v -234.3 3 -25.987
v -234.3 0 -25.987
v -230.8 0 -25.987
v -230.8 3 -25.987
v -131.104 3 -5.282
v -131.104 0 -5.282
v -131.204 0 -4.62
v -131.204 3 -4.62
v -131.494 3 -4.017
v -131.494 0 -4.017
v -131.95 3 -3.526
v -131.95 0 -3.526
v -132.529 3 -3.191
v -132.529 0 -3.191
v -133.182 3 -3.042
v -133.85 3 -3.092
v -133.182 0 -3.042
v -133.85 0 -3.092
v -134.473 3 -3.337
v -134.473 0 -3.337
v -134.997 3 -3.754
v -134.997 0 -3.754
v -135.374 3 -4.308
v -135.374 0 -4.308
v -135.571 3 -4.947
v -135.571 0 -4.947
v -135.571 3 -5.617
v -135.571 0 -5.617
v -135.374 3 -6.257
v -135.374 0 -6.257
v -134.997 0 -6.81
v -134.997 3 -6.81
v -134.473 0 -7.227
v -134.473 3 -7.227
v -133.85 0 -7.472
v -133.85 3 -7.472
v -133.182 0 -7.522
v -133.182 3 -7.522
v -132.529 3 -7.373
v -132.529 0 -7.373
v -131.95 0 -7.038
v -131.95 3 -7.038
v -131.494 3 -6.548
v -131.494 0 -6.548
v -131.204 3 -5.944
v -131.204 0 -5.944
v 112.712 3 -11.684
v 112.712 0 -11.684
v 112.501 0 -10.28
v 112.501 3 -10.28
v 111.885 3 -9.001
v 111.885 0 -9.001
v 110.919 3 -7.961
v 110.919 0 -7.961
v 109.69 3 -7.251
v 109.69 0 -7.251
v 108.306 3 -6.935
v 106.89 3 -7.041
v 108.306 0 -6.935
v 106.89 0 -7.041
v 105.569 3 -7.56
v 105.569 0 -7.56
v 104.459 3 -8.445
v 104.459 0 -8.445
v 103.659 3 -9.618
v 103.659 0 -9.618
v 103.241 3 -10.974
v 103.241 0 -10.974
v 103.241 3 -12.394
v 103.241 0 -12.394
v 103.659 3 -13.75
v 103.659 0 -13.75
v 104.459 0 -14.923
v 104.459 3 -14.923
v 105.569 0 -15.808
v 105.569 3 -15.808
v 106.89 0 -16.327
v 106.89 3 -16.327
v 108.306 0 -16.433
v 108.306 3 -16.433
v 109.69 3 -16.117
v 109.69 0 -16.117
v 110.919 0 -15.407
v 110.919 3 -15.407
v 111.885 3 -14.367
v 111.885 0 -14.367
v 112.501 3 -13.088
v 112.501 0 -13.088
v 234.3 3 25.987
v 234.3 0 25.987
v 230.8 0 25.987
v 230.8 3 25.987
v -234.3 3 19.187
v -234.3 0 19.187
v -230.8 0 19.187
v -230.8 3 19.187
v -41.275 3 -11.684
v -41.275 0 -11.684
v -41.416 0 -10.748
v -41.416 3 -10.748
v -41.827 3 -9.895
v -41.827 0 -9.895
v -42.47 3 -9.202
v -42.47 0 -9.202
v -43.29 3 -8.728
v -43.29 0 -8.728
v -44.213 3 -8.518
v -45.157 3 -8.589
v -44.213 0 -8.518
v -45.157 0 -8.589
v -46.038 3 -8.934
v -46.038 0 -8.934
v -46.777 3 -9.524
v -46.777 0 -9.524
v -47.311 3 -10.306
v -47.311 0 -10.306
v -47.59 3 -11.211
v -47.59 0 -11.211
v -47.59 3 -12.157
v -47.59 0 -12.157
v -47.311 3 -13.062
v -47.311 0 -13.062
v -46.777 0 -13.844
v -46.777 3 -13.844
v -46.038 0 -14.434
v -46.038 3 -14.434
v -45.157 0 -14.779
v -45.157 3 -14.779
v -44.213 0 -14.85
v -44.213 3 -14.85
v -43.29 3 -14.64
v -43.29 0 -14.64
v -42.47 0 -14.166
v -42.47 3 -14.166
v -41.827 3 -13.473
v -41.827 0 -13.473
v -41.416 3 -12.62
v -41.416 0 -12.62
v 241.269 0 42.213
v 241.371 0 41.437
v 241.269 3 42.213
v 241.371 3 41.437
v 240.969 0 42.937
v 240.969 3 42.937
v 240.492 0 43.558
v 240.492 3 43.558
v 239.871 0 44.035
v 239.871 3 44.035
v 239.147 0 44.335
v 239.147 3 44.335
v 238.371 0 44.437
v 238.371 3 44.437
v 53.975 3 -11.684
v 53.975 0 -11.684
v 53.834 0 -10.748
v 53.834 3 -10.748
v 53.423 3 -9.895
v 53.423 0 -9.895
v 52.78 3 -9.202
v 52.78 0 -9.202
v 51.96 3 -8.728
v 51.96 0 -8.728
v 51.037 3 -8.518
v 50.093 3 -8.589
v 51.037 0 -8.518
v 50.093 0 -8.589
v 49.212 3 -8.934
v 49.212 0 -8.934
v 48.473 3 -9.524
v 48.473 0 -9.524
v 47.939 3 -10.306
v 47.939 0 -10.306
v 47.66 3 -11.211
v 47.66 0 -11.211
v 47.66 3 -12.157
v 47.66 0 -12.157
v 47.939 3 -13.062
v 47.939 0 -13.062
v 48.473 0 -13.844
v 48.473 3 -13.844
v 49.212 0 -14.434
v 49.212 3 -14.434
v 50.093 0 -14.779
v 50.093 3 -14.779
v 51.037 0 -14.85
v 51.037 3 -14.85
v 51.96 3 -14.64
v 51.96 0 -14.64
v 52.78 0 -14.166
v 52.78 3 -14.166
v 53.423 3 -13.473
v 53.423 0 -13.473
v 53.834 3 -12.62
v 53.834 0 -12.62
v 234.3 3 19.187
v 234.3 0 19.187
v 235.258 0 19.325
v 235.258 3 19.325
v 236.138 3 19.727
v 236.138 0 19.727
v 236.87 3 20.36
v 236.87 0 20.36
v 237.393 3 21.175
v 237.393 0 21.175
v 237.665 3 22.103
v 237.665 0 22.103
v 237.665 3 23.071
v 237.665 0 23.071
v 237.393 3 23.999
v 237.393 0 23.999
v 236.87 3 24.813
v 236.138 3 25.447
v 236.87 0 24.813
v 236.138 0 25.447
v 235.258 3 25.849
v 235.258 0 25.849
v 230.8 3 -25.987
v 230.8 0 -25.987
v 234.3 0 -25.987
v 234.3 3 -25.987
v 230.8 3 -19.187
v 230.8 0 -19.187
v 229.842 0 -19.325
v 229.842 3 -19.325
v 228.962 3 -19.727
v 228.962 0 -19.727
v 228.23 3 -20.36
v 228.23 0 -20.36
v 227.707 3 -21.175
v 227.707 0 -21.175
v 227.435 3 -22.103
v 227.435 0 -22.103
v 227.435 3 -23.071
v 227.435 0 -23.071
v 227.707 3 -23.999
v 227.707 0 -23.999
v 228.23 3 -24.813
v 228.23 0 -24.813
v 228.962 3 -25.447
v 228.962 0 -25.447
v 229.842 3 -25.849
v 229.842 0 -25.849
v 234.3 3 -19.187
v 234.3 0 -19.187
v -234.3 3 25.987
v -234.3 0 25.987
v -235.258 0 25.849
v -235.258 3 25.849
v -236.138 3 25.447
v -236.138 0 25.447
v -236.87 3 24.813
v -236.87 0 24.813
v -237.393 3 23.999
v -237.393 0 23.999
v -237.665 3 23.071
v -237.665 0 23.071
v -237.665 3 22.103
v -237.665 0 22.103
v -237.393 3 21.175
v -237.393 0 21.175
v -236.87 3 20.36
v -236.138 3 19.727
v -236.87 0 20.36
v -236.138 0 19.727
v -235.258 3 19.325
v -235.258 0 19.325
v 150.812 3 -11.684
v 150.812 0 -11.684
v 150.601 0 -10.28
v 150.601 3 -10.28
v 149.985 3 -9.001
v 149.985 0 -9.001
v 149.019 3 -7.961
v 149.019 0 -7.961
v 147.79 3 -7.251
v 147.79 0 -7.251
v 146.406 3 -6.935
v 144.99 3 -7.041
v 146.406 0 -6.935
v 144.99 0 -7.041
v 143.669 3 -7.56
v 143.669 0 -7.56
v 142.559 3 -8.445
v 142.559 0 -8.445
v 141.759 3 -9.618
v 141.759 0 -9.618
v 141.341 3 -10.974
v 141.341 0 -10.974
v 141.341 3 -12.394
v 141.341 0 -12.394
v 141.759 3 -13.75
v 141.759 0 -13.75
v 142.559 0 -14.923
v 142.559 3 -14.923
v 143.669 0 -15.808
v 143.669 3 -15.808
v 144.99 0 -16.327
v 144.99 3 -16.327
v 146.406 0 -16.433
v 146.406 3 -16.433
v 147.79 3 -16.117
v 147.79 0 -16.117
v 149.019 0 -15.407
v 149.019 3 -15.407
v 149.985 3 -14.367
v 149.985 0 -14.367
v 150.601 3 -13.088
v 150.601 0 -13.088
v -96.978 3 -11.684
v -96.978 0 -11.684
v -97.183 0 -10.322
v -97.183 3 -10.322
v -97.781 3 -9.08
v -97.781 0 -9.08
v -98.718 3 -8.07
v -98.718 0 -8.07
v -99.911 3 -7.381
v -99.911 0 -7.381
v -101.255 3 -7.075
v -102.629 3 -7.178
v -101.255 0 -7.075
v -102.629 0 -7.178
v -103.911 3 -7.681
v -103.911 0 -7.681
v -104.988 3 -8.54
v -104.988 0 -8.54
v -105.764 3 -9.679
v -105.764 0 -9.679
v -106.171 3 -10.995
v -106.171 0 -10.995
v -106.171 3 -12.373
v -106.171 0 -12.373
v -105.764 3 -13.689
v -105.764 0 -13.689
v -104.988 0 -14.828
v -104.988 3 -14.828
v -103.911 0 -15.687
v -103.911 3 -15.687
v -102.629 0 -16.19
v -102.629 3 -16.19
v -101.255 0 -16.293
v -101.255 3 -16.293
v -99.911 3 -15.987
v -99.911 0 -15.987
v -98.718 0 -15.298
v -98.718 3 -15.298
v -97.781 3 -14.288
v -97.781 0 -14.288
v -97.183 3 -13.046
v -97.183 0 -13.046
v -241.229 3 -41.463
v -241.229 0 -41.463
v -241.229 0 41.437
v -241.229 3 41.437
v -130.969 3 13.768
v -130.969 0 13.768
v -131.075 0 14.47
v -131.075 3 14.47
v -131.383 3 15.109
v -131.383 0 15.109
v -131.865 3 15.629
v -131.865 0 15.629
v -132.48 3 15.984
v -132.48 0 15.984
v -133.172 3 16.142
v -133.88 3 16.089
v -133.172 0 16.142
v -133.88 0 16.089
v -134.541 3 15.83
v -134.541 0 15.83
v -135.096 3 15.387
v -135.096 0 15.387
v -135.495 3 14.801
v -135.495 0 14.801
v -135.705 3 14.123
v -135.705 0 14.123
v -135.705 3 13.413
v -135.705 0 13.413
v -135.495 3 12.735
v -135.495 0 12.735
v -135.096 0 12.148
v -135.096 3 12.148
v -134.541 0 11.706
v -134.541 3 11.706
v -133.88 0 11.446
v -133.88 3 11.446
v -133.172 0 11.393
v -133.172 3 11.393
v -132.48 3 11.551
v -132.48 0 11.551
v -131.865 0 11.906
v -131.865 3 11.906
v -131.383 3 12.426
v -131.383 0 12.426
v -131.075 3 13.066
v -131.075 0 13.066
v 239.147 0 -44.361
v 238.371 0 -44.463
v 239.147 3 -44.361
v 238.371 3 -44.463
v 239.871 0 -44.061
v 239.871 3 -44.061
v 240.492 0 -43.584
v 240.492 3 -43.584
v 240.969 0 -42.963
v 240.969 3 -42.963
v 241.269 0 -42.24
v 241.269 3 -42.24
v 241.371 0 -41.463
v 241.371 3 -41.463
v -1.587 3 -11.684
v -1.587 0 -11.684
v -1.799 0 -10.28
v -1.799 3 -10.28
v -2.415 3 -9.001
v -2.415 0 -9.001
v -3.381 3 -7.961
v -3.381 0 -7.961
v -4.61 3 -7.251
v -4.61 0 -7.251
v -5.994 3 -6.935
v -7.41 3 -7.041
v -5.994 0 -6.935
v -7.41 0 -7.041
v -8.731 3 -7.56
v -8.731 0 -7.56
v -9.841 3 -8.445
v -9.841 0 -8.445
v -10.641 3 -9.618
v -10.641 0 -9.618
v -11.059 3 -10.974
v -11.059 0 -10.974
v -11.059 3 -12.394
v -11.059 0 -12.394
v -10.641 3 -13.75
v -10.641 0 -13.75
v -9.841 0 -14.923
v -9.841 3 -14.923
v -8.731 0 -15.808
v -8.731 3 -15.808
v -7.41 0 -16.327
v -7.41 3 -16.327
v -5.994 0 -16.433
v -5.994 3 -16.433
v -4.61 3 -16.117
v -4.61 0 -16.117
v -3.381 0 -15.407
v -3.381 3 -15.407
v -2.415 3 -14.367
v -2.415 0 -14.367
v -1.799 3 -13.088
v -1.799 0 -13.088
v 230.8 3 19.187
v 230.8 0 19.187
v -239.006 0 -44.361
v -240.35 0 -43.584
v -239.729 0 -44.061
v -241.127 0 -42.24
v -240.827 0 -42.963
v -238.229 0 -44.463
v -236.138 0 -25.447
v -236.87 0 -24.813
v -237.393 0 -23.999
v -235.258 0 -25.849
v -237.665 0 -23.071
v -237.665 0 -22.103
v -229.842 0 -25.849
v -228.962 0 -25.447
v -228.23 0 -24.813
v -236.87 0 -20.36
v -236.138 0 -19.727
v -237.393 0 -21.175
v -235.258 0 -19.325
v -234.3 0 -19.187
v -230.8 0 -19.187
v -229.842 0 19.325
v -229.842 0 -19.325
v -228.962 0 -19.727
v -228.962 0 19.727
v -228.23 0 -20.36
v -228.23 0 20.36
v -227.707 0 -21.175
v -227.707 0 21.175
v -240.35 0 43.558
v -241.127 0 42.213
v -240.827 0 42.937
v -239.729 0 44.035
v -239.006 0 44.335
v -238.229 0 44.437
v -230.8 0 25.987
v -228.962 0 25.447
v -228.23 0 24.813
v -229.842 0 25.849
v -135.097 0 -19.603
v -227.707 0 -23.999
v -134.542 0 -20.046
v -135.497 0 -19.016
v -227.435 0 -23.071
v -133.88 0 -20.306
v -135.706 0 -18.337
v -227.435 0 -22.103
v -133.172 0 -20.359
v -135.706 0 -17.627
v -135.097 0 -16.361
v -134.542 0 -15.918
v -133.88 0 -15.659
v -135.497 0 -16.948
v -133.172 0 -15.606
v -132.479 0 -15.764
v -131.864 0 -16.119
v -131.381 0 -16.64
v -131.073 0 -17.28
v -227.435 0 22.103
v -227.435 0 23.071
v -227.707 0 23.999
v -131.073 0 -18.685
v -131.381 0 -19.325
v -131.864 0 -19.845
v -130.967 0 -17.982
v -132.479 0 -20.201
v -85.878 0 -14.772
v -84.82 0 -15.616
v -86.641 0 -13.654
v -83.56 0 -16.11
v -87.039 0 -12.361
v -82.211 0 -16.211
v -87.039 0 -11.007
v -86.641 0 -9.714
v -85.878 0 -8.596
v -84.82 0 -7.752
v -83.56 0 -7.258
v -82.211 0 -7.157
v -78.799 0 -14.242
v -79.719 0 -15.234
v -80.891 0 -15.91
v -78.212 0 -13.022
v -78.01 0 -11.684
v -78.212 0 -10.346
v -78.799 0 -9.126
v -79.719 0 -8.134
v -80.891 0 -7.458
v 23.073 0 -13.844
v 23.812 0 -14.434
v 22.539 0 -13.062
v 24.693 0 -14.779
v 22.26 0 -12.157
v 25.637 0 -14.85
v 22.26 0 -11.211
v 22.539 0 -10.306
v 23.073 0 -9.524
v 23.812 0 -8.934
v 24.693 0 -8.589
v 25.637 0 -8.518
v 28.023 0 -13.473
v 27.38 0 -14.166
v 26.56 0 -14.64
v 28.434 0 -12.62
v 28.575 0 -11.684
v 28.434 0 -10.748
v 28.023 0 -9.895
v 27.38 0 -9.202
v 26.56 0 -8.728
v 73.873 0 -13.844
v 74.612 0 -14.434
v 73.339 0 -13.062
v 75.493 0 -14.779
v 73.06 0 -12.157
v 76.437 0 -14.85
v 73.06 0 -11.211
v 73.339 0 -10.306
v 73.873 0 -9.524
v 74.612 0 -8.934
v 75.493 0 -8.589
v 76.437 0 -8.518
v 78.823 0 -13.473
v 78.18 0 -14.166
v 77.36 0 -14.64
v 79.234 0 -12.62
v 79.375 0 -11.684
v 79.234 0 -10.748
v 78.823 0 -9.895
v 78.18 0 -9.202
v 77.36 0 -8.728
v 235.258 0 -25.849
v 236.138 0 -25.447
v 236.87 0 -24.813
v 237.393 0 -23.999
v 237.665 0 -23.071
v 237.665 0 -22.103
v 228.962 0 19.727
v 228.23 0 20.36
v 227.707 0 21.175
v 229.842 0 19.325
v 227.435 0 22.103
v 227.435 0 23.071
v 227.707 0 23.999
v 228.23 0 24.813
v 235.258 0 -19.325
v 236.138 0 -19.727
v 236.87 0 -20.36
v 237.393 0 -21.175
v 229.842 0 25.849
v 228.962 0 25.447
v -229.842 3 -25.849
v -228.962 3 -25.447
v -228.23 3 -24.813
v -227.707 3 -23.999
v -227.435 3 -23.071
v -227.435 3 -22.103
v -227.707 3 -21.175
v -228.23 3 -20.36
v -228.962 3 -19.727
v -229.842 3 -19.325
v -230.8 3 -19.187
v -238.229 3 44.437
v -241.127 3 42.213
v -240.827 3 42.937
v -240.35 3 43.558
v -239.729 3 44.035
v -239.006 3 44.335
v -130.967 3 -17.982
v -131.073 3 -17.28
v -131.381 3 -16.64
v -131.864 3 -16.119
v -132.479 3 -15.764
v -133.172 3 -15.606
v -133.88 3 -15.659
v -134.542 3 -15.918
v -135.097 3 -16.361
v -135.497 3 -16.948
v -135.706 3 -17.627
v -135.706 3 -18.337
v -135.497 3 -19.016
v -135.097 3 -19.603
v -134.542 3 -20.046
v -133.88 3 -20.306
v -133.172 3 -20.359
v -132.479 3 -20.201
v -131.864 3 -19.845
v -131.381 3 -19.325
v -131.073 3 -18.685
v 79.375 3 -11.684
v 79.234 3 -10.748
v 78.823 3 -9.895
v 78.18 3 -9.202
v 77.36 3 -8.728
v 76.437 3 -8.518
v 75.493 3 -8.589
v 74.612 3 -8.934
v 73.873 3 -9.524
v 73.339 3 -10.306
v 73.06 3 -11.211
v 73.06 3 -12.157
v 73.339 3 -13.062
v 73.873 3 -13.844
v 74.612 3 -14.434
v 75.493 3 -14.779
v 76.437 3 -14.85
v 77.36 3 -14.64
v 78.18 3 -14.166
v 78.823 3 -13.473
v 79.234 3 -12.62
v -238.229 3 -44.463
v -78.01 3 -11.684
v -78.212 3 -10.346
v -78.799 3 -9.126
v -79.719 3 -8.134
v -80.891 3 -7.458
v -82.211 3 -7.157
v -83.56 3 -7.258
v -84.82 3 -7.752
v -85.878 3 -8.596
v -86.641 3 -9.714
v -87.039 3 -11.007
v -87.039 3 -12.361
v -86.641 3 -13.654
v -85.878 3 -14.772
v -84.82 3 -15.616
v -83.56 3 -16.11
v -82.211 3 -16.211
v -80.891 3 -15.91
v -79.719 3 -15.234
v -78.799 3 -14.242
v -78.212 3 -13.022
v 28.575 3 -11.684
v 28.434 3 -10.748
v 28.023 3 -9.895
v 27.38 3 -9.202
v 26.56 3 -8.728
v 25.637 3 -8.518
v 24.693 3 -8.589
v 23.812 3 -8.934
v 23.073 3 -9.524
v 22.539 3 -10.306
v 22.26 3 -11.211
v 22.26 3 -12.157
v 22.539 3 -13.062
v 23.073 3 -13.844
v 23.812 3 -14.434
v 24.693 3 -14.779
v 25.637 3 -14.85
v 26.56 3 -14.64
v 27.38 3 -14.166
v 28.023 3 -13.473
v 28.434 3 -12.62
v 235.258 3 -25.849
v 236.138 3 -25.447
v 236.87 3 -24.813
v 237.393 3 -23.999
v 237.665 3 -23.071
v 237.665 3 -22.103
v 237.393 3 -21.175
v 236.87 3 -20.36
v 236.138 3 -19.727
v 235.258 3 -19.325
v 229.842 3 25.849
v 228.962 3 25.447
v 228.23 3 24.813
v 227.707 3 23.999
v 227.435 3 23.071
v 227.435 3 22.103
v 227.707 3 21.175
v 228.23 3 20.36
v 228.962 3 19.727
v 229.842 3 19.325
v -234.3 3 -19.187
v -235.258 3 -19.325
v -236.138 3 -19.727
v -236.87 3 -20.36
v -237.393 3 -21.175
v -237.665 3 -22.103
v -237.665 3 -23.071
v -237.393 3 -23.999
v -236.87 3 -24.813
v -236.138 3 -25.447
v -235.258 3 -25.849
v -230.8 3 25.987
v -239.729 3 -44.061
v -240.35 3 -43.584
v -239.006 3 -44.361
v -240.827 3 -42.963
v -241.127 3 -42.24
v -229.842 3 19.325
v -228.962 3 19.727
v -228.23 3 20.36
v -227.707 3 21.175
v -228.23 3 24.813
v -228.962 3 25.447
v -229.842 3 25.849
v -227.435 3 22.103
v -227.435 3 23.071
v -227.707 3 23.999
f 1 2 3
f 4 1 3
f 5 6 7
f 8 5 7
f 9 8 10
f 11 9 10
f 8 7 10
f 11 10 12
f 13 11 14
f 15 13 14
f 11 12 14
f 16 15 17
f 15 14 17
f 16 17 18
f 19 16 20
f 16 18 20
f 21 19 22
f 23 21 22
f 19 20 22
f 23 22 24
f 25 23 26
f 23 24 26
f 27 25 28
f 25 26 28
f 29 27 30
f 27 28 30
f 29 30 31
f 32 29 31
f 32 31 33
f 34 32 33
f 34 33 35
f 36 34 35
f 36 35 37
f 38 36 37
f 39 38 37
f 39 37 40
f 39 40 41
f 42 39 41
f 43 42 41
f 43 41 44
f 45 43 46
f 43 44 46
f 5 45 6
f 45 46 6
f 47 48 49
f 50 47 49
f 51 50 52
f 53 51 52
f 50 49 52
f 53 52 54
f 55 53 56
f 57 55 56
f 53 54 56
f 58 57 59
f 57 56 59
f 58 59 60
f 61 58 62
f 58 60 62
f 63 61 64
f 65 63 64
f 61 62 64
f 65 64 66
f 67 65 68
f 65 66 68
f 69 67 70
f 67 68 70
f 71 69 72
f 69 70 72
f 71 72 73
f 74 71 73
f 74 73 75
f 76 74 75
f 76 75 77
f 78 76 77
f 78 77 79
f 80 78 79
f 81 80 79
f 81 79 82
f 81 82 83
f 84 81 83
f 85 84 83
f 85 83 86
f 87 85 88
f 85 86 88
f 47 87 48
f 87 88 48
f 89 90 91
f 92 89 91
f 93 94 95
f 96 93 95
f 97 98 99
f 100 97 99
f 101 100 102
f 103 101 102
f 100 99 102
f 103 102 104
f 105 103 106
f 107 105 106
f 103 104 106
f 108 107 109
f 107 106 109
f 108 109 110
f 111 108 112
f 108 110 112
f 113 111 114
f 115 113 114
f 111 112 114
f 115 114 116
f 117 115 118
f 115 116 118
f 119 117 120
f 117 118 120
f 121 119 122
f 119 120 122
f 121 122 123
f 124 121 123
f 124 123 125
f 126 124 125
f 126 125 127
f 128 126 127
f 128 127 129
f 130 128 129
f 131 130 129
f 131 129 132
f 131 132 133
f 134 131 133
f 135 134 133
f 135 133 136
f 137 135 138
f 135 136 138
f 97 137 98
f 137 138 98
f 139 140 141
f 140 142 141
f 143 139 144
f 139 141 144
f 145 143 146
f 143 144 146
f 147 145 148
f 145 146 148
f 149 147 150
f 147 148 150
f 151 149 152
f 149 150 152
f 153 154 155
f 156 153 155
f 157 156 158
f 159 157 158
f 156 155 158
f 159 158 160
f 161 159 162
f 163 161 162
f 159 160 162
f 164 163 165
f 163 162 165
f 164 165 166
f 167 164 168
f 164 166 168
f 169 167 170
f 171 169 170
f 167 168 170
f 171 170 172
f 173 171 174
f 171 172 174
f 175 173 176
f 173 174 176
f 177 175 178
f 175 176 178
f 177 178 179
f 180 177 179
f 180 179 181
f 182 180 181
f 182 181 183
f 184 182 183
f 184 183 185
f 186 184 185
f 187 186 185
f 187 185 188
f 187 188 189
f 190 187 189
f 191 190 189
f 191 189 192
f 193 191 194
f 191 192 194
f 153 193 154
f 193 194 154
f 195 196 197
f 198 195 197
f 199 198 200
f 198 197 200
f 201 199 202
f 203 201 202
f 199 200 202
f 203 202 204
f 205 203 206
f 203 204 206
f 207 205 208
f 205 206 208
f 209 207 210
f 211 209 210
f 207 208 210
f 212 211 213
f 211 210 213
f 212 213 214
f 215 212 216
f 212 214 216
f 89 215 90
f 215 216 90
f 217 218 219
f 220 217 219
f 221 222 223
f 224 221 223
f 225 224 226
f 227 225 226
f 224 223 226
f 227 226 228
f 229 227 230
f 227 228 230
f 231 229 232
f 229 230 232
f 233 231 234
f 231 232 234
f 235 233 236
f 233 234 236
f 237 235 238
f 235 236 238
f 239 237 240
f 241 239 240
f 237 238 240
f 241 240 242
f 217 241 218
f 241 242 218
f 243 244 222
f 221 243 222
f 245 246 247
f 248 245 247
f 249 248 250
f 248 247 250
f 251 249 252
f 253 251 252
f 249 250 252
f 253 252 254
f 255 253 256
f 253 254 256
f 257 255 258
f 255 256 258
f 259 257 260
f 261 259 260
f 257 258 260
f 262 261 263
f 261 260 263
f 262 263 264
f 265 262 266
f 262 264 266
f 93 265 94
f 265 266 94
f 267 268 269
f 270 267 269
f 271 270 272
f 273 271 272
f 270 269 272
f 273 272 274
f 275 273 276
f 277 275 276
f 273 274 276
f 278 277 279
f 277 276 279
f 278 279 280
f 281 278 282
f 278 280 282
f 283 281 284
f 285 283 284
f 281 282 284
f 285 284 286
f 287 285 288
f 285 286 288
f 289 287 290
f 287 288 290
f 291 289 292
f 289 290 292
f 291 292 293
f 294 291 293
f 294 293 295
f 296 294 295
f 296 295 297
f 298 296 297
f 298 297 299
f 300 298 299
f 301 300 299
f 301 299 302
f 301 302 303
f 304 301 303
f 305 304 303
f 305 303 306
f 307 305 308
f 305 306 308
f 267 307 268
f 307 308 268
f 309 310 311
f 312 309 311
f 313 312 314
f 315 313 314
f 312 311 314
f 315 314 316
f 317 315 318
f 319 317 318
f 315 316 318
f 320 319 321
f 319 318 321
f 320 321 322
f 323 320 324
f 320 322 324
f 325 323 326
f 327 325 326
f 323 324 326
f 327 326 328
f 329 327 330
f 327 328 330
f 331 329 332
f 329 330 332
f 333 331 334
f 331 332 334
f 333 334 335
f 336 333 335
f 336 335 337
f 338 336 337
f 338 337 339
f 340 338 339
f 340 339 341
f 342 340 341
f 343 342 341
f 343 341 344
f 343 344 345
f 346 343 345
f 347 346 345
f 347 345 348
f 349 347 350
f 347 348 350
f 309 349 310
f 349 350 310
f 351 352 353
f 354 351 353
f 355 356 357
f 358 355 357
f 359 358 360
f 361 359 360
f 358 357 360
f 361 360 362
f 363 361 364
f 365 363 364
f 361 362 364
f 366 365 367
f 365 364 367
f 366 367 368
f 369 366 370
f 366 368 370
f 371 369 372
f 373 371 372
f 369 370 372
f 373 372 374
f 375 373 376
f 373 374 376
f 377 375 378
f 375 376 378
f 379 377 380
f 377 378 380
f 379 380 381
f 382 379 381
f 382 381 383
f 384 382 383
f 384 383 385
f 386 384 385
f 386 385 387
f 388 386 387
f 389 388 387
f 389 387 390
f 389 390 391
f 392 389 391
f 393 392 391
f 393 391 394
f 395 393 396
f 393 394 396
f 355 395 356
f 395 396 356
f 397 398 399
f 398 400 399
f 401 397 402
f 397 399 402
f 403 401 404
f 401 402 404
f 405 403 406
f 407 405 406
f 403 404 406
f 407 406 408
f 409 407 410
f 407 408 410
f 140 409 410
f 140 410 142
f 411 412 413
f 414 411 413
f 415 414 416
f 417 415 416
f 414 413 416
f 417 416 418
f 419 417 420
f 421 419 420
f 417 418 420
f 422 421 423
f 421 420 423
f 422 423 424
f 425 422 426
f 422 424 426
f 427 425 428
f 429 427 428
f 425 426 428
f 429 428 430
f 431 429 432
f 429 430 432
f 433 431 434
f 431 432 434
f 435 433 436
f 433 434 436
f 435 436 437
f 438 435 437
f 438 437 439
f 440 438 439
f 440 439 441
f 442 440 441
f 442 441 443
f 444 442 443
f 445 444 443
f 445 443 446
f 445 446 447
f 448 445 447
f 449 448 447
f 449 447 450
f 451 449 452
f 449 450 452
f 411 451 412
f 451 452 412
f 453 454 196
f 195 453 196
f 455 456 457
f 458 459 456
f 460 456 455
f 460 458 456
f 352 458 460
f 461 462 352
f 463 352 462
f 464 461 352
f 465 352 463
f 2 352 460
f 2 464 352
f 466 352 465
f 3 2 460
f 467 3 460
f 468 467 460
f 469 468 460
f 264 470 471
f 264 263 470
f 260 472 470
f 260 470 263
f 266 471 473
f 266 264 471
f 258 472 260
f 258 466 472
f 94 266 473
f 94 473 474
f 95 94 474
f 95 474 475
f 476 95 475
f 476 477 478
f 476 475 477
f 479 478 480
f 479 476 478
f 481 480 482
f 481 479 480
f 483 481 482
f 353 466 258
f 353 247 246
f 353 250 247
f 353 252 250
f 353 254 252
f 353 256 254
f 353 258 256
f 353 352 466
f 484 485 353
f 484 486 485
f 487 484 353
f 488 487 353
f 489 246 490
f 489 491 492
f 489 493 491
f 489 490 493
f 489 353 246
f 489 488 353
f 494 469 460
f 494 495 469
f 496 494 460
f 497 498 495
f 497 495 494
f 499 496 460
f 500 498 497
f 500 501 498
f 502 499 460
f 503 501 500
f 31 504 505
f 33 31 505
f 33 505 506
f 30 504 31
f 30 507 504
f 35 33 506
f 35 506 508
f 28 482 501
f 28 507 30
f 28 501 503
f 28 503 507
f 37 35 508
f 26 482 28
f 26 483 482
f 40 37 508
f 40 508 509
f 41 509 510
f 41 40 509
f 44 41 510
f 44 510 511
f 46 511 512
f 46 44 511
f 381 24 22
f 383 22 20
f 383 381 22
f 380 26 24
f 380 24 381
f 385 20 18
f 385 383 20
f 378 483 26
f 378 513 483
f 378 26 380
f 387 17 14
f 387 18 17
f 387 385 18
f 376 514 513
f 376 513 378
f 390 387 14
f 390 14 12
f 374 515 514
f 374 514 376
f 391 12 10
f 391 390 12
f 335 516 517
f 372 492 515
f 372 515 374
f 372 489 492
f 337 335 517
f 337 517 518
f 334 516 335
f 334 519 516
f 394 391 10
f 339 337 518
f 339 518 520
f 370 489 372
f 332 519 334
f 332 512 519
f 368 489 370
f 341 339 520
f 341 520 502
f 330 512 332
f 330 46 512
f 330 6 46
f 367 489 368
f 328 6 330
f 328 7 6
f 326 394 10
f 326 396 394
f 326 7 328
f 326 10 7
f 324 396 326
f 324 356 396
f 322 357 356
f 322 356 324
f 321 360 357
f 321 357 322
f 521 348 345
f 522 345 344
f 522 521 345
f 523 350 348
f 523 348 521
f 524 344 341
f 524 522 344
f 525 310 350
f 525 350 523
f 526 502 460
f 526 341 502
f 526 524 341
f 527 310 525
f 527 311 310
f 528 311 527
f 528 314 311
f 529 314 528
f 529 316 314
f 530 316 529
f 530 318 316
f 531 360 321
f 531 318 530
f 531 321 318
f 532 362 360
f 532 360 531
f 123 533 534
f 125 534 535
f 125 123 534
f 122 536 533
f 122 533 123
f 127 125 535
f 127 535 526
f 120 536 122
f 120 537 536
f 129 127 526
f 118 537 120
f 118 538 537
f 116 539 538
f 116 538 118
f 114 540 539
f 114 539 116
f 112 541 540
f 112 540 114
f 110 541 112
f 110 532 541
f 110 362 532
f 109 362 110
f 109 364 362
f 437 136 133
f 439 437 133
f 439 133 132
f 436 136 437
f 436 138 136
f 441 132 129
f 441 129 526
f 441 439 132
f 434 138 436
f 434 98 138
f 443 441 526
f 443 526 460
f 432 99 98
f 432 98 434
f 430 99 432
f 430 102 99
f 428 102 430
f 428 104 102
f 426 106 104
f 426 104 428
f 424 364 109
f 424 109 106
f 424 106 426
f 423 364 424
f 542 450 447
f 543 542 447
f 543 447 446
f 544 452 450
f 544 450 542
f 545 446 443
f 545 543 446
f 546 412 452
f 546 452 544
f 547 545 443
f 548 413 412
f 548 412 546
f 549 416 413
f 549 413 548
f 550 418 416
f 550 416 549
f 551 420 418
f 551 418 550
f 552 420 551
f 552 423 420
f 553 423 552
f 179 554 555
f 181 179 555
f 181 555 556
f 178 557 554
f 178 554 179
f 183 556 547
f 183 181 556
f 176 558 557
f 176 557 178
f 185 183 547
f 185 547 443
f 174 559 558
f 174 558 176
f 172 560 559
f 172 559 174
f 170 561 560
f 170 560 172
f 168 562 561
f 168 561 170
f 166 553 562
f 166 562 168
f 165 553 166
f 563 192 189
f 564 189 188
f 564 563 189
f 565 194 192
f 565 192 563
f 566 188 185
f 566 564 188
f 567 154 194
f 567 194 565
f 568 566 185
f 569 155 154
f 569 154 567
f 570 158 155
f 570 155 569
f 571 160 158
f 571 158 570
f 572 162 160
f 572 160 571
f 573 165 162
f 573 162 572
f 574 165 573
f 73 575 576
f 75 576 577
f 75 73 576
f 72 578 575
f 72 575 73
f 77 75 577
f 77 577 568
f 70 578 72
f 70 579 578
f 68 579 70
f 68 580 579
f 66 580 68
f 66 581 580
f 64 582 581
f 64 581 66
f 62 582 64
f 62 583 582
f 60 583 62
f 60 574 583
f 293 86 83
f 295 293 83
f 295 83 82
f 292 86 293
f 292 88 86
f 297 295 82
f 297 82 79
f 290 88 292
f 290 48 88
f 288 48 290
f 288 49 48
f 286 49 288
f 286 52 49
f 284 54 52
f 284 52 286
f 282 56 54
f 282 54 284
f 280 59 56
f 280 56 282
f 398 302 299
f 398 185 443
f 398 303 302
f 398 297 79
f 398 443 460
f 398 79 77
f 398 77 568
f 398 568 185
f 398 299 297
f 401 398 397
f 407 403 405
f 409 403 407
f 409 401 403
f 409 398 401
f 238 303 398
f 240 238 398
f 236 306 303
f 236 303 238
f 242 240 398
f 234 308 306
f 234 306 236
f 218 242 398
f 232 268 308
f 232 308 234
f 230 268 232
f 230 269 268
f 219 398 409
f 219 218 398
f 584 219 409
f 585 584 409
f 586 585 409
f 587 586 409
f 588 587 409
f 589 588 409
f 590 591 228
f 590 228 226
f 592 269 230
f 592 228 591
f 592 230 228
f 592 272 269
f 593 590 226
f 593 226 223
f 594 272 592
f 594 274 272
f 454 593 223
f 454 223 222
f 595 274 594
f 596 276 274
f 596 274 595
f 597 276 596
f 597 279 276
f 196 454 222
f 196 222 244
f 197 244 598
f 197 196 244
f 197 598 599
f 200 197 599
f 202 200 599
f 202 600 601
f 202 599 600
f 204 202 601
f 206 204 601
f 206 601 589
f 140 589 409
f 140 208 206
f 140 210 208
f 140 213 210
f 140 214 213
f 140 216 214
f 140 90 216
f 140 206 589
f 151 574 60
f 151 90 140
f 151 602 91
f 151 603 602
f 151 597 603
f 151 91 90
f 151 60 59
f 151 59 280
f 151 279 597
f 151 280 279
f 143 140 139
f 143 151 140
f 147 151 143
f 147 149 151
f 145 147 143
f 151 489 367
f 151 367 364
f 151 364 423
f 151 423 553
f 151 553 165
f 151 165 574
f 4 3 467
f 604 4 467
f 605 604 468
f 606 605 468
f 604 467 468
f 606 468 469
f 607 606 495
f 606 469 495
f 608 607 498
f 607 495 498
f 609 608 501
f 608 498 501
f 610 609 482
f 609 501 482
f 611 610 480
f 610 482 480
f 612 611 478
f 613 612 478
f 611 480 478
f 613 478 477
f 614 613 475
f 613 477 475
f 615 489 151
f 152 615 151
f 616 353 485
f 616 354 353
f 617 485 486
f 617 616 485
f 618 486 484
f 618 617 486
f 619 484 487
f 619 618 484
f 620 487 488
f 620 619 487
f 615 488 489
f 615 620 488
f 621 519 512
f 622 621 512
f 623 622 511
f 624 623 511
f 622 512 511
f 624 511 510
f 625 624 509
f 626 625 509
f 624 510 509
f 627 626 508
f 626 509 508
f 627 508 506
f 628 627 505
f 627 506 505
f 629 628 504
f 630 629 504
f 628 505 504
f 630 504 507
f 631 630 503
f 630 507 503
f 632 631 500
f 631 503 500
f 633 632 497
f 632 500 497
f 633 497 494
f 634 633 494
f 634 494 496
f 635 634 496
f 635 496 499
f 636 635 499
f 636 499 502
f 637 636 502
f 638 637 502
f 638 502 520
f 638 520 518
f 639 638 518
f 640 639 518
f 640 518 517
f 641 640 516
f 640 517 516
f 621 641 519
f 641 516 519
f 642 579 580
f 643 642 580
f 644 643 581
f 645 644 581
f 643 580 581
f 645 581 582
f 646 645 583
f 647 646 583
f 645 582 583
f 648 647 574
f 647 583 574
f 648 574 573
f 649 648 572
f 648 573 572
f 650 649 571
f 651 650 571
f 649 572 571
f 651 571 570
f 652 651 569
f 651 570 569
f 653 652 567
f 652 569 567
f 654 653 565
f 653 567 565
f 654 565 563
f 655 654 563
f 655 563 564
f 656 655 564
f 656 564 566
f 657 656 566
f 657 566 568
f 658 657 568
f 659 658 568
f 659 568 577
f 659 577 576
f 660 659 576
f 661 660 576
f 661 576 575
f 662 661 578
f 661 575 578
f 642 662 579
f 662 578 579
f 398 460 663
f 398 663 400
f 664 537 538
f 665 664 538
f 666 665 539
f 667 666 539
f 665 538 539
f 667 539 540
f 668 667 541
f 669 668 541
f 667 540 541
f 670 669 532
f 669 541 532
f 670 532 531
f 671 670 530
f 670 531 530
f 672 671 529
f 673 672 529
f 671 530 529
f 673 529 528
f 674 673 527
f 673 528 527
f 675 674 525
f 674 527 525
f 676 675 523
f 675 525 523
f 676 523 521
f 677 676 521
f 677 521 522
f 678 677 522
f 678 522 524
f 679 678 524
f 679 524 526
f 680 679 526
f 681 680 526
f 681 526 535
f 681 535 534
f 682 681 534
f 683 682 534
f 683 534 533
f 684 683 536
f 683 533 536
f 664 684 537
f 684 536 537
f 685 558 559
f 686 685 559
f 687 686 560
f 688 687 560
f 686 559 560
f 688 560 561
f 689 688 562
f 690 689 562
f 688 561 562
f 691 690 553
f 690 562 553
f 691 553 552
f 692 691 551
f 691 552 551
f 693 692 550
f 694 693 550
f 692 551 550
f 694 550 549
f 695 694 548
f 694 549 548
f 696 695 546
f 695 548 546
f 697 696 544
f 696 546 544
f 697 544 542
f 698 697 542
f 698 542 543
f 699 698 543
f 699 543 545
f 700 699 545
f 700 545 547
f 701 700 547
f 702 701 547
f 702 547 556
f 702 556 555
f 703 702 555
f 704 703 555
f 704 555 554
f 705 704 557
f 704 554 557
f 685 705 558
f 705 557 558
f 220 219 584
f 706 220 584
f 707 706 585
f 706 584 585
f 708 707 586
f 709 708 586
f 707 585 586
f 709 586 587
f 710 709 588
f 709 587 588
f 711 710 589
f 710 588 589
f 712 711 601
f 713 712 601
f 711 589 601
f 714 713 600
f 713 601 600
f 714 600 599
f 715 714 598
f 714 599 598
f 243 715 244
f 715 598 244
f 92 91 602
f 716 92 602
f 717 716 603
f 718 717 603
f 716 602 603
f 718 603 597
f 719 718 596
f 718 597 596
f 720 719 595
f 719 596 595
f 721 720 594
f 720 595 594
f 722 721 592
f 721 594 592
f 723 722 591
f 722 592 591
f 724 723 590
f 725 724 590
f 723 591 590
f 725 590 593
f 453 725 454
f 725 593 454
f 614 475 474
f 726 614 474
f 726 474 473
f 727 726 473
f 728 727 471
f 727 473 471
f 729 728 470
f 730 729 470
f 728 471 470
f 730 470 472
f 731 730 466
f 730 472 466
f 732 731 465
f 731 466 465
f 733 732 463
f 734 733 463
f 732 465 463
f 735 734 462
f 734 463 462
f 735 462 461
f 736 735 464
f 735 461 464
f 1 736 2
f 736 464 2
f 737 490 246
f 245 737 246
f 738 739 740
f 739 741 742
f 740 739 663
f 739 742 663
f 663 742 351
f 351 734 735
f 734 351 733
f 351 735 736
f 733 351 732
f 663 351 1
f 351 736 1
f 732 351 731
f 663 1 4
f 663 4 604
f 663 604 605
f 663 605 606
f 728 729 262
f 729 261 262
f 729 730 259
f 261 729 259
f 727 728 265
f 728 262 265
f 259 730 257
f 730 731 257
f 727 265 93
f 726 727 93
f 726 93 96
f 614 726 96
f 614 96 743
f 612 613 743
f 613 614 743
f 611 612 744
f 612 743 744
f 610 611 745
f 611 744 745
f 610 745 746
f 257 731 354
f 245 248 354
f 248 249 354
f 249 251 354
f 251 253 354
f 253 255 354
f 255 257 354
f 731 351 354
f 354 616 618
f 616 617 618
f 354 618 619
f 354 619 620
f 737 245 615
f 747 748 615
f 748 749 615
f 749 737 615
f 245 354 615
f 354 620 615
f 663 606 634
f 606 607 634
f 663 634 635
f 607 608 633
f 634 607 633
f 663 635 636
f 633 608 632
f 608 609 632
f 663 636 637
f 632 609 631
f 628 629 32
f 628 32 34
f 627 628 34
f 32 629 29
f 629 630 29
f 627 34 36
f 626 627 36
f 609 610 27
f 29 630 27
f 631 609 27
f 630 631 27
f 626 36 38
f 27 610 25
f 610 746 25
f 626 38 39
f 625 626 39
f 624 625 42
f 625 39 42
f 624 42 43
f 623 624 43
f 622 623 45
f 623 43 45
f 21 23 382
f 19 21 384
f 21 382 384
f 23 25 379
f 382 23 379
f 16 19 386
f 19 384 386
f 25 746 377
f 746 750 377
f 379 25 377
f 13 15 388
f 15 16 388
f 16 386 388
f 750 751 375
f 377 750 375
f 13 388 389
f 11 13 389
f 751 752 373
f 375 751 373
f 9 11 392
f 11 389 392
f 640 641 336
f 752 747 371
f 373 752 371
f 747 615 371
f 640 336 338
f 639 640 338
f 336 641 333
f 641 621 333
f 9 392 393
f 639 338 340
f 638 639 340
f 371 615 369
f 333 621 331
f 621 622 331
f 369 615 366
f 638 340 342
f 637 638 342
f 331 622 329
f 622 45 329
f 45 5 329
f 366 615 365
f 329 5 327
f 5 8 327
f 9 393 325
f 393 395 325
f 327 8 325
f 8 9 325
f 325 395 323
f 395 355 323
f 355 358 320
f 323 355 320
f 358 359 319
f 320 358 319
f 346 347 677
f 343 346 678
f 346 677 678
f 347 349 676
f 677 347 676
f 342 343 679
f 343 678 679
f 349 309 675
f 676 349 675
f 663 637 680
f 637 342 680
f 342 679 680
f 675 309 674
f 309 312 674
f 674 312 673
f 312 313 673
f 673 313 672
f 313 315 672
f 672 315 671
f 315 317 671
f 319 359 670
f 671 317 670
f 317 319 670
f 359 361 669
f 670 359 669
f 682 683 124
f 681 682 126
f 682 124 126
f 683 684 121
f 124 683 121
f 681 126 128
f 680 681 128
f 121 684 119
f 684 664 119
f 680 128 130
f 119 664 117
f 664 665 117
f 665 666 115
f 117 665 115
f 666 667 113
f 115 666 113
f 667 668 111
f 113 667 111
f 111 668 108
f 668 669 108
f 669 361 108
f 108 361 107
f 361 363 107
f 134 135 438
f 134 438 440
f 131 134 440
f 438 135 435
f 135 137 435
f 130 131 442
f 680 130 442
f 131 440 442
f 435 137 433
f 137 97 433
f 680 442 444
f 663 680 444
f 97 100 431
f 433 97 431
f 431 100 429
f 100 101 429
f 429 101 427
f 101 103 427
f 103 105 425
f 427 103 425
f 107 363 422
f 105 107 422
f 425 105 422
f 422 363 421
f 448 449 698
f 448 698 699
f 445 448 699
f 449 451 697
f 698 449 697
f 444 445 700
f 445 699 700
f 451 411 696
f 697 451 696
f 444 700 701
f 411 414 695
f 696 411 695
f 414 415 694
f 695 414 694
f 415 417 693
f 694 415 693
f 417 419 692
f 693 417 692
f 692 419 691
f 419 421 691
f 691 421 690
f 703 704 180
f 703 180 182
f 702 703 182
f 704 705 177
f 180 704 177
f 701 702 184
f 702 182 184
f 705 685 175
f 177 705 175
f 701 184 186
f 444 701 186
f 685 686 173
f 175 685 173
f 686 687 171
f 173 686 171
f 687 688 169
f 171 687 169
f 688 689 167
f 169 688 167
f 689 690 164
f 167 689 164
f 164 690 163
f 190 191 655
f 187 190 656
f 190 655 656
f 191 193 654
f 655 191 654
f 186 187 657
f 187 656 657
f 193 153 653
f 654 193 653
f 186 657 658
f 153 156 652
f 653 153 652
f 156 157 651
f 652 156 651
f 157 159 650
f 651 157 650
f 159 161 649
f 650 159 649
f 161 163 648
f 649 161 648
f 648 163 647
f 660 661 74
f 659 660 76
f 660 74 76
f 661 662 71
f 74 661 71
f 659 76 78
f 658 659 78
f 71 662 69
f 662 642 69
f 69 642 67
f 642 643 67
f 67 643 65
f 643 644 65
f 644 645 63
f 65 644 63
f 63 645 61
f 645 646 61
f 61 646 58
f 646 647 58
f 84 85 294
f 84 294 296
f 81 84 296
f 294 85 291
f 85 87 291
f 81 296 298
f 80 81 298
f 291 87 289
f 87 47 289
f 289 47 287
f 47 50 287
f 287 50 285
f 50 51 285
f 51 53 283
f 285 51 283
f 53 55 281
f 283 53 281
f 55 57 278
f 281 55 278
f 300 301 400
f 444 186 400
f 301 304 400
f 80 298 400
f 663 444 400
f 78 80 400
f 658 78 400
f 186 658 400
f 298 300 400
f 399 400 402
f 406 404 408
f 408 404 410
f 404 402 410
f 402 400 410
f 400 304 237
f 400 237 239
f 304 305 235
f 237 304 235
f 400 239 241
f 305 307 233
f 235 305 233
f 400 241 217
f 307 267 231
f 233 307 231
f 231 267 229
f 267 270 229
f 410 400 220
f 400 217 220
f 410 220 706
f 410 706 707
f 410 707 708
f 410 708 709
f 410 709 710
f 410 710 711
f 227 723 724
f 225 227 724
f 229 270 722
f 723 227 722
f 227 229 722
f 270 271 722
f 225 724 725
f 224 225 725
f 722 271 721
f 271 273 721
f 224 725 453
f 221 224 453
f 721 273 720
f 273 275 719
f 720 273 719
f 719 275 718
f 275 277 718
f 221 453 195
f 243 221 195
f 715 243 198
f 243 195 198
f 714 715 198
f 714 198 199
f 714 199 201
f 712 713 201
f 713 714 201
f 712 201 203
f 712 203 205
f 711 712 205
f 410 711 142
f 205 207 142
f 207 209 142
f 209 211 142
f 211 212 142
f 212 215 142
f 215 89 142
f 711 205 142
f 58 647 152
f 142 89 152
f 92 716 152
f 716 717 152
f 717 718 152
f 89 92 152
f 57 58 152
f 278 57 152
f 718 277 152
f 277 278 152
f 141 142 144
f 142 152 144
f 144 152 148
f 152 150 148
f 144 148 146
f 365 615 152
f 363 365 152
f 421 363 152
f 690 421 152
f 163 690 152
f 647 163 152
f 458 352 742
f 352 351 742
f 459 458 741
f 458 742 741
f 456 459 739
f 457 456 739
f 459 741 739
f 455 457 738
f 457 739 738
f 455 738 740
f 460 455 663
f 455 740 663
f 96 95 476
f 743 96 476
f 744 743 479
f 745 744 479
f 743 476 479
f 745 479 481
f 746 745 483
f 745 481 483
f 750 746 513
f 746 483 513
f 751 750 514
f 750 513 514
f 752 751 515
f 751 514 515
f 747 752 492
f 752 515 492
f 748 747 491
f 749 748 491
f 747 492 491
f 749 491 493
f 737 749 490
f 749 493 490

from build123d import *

# Parameters (mm, degrees)
F0_W     = 482.6
F0_H     = 88.9
F1_DEPTH = 3
F2_R     = 3
F3_R     = 2.38125
F3_R_2   = 2.246181
F3_R_3   = 2.383077
F3_R_4   = 4.622163
F3_R_5   = 4.540173
F3_R_6   = 3.175
F3_R_7   = 4.7625
F4_DEPTH = 3


with BuildPart() as f1:
    # F0 (on Front) → F1 (new body)
    with BuildSketch(Plane.XZ):
        with Locations((0.070956, -0.013071)):
            Rectangle(F0_W, F0_H)
    extrude(amount=-F1_DEPTH)

    # F2
    f2_edges = [f1.edges().sort_by_distance(p)[0] for p in [
        (-241.229044, 1.5, 44.436929),
        (241.370956, 1.5, 44.436929),
        (241.370956, 1.5, -44.463071),
        (-241.229044, 1.5, -44.463071),
    ]]
    fillet(f2_edges, radius=F2_R)

    # F3 (on Front) → F4 (cut, through all)
    with BuildSketch(Plane.XZ):
        with BuildLine():
            Line((-234.3, 19.186929), (-230.8, 19.186929))
            ThreePointArc((-230.8, 19.186929), (-227.4, 22.586929), (-230.8, 25.986929))
            Line((-230.8, 25.986929), (-234.3, 25.986929))
            ThreePointArc((-234.3, 25.986929), (-237.7, 22.586929), (-234.3, 19.186929))
        make_face()
        with BuildLine():
            ThreePointArc((230.8, 25.986929), (227.4, 22.586929), (230.8, 19.186929))
            Line((230.8, 19.186929), (234.3, 19.186929))
            ThreePointArc((234.3, 19.186929), (237.7, 22.586929), (234.3, 25.986929))
            Line((234.3, 25.986929), (230.8, 25.986929))
        make_face()
        with BuildLine():
            Line((230.8, -25.986929), (234.3, -25.986929))
            ThreePointArc((234.3, -25.986929), (237.7, -22.586929), (234.3, -19.186929))
            Line((234.3, -19.186929), (230.8, -19.186929))
            ThreePointArc((230.8, -19.186929), (227.4, -22.586929), (230.8, -25.986929))
        make_face()
        with BuildLine():
            ThreePointArc((-230.8, -25.986929), (-227.4, -22.586929), (-230.8, -19.186929))
            Line((-230.8, -19.186929), (-234.3, -19.186929))
            ThreePointArc((-234.3, -19.186929), (-237.7, -22.586929), (-234.3, -25.986929))
            Line((-234.3, -25.986929), (-230.8, -25.986929))
        make_face()
        with Locations((-133.35, 13.767754)):
            Circle(F3_R)
        with Locations((-133.35, -5.282246)):
            Circle(F3_R_2)
        with Locations((-133.35, -17.982246)):
            Circle(F3_R_3)
        with Locations((-101.6, -11.684)):
            Circle(F3_R_4)
        with Locations((-82.55, -11.684)):
            Circle(F3_R_5)
        with Locations((-44.45, -11.684)):
            Circle(F3_R_6)
        with Locations((-6.35, -11.684)):
            Circle(F3_R_7)
        with Locations((25.4, -11.684)):
            Circle(F3_R_6)
        with Locations((50.8, -11.684)):
            Circle(F3_R_6)
        with Locations((76.2, -11.684)):
            Circle(F3_R_6)
        with Locations((107.95, -11.684)):
            Circle(F3_R_7)
        with Locations((146.05, -11.684)):
            Circle(F3_R_7)
    extrude(amount=-F4_DEPTH, mode=Mode.SUBTRACT)


solid = f1.part
